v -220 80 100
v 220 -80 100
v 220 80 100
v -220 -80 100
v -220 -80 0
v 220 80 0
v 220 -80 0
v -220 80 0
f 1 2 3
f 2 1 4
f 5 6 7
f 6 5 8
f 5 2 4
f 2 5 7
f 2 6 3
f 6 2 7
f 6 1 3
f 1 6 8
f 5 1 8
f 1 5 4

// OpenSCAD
// Generated documentary F1 envelope proxy.
// Not manufacturing geometry, not dimensionally validated, not SimReady.
proxy_id = "993-INTERCOOLER-PRESSURE-HOSE-KIT-FVD";
$fn = 96;

length_mm = 440;
width_mm = 160;
height_mm = 100;

translate([-length_mm / 2, -width_mm / 2, 0])
    cube([length_mm, width_mm, height_mm], center = false);
